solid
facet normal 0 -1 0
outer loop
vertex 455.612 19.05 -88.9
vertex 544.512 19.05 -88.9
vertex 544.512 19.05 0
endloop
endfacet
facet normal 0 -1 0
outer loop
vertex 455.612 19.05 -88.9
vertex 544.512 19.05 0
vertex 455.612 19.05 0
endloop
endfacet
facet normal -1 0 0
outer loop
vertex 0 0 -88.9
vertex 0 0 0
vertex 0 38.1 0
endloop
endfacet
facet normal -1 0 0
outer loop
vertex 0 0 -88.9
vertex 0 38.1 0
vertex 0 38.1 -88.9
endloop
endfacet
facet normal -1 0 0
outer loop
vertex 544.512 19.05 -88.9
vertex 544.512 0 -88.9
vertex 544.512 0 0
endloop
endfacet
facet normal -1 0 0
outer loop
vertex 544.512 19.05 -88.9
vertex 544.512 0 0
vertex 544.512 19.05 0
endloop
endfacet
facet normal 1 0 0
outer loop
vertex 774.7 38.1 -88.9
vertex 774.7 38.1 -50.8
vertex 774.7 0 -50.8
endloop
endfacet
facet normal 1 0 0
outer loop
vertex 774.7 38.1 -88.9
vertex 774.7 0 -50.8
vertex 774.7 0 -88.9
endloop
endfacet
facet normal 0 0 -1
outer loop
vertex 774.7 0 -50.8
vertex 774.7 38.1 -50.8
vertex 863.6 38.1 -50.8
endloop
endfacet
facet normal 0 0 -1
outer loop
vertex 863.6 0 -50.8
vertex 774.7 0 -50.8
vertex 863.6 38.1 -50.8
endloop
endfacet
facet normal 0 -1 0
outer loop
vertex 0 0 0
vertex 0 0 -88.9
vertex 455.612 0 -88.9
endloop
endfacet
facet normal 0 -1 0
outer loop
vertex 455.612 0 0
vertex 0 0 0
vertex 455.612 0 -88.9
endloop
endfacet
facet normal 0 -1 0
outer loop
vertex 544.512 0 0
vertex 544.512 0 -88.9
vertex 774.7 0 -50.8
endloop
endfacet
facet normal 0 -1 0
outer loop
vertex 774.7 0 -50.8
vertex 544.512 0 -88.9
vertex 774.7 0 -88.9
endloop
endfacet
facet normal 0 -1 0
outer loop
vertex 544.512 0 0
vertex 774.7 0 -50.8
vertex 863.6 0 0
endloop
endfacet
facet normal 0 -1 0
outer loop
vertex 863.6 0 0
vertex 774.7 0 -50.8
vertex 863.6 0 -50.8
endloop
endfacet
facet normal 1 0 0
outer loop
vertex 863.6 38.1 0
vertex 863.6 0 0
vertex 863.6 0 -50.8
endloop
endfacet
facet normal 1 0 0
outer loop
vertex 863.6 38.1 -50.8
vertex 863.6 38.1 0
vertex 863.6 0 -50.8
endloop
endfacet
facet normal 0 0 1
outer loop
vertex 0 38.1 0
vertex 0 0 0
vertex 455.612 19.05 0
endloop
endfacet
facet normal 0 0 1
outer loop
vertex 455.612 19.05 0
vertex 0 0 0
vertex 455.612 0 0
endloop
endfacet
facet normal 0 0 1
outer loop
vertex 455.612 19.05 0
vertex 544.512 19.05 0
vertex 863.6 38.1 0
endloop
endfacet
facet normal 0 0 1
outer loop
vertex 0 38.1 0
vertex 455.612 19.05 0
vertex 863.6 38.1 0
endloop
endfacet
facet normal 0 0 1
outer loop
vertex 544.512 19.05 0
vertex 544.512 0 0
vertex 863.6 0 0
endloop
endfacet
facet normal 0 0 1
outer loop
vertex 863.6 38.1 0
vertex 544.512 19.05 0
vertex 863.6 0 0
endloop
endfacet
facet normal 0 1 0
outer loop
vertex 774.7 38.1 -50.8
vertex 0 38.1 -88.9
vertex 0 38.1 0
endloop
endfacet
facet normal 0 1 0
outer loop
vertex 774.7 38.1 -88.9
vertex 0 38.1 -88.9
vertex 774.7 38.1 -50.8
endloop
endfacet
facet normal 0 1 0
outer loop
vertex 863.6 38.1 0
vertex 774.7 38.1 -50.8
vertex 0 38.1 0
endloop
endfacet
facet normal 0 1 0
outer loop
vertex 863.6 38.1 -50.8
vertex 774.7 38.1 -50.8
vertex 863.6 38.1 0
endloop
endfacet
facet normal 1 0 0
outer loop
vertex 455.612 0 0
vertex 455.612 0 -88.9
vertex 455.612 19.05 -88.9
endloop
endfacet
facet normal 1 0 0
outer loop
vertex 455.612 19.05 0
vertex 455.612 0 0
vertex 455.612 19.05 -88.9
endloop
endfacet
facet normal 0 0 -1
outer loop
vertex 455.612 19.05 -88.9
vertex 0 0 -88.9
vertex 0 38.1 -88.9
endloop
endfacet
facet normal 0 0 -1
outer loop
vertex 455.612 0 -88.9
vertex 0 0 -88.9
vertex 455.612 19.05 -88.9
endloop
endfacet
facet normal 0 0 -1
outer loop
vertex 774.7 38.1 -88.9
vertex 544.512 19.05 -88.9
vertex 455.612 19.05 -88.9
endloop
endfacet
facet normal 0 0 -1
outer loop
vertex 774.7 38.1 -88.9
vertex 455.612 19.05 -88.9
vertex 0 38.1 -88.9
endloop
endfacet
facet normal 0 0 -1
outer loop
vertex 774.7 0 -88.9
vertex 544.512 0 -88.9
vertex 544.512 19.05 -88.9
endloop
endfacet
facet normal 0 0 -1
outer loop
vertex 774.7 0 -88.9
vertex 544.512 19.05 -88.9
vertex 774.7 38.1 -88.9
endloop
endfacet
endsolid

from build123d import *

# Parameters (mm, degrees)
SKETCH1_W           = 863.6
SKETCH1_H           = 88.9
BOSS_EXTRUDE1_DEPTH = 38.1
SKETCH3_W           = 88.9
SKETCH3_H           = 38.1
CUT_EXTRUDE2_DEPTH  = 39.1
SKETCH4_W           = 88.9
SKETCH4_H           = 19.05
CUT_EXTRUDE3_DEPTH  = 89.9


with BuildPart() as part:
    # Sketch1 → Boss-Extrude1 (new body)
    with BuildSketch(Plane(origin=(0, 0, 0), x_dir=(1, 0, 0), z_dir=(0, 1, 0))):
        with Locations((431.8, 44.45)):
            Rectangle(SKETCH1_W, SKETCH1_H)
    extrude(amount=BOSS_EXTRUDE1_DEPTH)

    # Sketch3 → Cut-Extrude2 (cut, through all)
    with BuildSketch(Plane(origin=(0, 38.1, 0), x_dir=(1, 0, 0), z_dir=(0, 1, 0))):
        with Locations((819.15, 69.85)):
            Rectangle(SKETCH3_W, SKETCH3_H)
    extrude(amount=-CUT_EXTRUDE2_DEPTH, mode=Mode.SUBTRACT)

    # Sketch4 → Cut-Extrude3 (cut, through all)
    with BuildSketch(Plane(origin=(0, 0, -88.9), x_dir=(-1, 0, 0), z_dir=(0, 0, -1))):
        with Locations((-500.0625, 9.525)):
            Rectangle(SKETCH4_W, SKETCH4_H)
    extrude(amount=-CUT_EXTRUDE3_DEPTH, mode=Mode.SUBTRACT)


solid = part.part
